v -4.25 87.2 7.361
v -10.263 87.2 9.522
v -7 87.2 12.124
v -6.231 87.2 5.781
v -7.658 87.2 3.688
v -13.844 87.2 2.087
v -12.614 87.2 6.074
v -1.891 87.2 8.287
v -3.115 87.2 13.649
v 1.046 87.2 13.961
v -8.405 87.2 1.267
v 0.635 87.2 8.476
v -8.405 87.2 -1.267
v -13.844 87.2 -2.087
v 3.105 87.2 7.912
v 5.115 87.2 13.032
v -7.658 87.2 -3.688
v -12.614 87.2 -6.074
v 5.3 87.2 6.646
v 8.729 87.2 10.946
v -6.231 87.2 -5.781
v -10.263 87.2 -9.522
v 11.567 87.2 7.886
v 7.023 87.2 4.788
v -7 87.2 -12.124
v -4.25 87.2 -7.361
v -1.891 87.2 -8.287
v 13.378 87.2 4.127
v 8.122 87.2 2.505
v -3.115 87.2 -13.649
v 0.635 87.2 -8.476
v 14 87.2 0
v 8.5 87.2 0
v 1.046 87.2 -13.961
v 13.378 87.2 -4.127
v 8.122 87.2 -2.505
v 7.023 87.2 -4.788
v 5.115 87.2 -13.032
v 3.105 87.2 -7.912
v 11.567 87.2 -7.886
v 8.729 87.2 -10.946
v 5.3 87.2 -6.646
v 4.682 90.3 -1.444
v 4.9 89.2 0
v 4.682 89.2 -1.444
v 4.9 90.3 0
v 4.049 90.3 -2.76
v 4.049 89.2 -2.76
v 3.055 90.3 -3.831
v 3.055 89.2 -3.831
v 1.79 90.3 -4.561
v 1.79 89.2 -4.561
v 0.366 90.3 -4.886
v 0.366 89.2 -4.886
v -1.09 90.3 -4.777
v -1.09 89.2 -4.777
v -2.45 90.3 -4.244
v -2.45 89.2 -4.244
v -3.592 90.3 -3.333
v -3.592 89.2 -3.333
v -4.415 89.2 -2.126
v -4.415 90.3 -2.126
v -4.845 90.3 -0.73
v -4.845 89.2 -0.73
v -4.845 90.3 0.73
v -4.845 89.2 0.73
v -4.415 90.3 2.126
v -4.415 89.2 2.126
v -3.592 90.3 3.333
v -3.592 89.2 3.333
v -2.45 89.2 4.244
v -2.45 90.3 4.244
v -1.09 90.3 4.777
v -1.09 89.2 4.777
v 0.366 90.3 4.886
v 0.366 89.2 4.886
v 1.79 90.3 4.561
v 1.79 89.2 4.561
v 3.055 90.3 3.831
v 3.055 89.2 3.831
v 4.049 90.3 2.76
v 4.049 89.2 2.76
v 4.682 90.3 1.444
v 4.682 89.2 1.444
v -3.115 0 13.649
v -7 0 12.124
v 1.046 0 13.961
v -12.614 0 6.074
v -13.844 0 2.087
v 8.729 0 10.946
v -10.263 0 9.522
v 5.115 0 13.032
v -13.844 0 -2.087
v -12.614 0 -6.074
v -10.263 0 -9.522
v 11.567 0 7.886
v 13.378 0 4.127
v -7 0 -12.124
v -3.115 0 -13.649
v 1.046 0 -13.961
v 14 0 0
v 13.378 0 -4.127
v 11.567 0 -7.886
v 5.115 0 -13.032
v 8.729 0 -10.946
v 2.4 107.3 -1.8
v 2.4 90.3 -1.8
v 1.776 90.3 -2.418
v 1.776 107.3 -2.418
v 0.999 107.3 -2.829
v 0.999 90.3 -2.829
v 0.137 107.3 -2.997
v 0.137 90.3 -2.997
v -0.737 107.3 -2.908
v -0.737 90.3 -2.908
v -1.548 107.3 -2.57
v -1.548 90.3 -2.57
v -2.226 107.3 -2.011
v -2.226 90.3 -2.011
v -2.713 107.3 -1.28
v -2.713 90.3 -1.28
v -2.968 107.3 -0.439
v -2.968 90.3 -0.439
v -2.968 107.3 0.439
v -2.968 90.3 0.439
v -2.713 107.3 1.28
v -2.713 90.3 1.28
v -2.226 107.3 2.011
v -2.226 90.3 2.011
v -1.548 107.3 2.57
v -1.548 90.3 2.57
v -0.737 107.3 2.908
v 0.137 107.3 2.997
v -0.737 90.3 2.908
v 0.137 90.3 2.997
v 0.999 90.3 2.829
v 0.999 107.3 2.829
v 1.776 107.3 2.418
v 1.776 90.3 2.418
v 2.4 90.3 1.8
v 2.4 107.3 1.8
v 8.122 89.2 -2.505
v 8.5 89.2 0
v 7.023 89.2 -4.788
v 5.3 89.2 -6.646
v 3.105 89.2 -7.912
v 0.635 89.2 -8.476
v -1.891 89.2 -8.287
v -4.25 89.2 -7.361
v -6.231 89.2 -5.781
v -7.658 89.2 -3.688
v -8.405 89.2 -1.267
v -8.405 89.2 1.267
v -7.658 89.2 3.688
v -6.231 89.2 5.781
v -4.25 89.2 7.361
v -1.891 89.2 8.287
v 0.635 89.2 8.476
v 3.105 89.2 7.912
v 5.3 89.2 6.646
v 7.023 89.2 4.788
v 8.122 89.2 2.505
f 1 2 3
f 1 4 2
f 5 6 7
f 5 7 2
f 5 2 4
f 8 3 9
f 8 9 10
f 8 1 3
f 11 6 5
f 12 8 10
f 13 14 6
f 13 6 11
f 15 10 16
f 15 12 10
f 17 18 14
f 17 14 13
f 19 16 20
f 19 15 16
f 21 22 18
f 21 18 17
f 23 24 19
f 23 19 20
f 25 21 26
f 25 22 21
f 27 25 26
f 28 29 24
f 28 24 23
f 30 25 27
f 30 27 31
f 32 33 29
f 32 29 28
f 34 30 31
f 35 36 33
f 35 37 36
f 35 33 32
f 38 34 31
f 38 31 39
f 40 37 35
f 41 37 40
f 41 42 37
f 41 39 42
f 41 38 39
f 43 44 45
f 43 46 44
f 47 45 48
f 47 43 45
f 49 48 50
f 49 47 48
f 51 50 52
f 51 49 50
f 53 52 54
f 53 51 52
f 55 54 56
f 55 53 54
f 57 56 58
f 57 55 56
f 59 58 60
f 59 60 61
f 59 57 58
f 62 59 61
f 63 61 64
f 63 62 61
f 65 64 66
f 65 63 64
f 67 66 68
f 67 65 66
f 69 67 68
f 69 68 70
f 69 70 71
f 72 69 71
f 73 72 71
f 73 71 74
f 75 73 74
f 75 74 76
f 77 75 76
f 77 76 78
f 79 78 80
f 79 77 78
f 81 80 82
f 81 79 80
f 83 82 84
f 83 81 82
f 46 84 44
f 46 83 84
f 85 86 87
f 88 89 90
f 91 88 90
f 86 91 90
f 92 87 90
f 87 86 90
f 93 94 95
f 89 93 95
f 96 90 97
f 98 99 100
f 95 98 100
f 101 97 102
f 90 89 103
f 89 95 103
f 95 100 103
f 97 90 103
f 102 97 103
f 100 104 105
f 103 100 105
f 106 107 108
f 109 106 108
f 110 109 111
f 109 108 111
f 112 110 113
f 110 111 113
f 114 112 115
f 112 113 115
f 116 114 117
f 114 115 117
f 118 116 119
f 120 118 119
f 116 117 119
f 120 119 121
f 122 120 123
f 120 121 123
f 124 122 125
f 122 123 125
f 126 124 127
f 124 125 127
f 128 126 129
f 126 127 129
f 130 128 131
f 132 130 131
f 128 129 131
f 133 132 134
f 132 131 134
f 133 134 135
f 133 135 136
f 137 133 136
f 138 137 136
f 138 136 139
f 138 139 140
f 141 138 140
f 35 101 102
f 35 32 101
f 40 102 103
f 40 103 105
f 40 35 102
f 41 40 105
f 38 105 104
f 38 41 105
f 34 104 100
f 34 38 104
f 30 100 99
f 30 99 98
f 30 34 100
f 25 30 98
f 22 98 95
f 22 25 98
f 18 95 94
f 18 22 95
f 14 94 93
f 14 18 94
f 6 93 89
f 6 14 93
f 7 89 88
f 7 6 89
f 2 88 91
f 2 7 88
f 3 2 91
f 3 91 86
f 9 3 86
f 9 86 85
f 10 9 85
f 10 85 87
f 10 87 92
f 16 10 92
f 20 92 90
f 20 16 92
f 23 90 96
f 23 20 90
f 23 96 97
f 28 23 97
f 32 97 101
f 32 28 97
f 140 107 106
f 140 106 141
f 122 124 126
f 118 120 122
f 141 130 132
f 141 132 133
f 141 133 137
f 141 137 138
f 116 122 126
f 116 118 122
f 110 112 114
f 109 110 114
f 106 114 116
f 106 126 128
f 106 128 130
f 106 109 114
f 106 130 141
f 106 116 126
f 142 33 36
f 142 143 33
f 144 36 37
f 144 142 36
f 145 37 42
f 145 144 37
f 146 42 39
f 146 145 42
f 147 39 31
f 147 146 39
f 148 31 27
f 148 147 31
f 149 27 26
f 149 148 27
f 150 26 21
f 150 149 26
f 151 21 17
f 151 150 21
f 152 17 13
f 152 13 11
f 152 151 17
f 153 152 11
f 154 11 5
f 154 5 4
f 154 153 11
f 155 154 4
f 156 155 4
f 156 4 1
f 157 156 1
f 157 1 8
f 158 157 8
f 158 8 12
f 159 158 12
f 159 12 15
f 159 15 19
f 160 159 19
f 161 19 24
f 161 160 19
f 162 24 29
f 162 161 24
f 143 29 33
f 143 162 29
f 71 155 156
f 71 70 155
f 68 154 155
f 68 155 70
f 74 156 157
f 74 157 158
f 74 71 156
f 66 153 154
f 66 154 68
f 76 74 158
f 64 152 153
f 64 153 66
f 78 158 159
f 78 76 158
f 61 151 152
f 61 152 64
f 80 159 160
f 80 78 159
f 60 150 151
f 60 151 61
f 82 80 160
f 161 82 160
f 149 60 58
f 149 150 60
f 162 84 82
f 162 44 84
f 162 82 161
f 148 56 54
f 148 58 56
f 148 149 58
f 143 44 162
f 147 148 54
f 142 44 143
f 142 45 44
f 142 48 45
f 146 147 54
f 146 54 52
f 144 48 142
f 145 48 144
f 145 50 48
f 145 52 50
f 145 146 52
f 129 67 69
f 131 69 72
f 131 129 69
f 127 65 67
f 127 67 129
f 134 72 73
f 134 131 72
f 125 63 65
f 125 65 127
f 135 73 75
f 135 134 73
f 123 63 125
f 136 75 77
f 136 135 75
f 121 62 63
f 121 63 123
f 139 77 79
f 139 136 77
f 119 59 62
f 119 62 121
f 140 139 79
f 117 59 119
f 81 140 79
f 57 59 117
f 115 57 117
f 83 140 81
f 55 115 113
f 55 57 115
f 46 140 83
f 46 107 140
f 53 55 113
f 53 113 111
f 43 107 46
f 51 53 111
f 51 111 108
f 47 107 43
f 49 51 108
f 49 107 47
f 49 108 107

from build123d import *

# Parameters (mm, degrees)
SKETCH_1_R          = 14
SKETCH_2_R          = 14
SKETCH_10_R         = 8.5
SKETCH_5_R          = 8.5
SKETCH_11_R         = 4.9
SKETCH_8_R          = 4.9
SKETCH_9_R          = 3
SKETCH_12_R         = 3
CUT_EXTRUDE_START   = -17
CUT_EXTRUDE_1_DEPTH = 17


with BuildPart() as part:
    # Эскиз1 → По сечениям2 section 0
    with BuildSketch(Plane(origin=(0, 0, 0), x_dir=(1, 0, 0), z_dir=(0, 1, 0))):
        Circle(SKETCH_1_R)
    # Эскиз2 → По сечениям2 section 1
    with BuildSketch(Plane(origin=(0, 87.2, 0), x_dir=(1, 0, 0), z_dir=(0, 1, 0))):
        Circle(SKETCH_2_R)
    loft()

    # Эскиз10 → По сечениям3 section 0
    with BuildSketch(Plane(origin=(0, 87.2, 0), x_dir=(1, 0, 0), z_dir=(0, 1, 0))):
        Circle(SKETCH_10_R)
    # Эскиз5 → По сечениям3 section 1
    with BuildSketch(Plane(origin=(0, 89.2, 0), x_dir=(1, 0, 0), z_dir=(0, 1, 0))):
        Circle(SKETCH_5_R)
    loft()

    # Эскиз11 → По сечениям4 section 0
    with BuildSketch(Plane(origin=(0, 89.2, 0), x_dir=(1, 0, 0), z_dir=(0, 1, 0))):
        Circle(SKETCH_11_R)
    # Эскиз8 → По сечениям4 section 1
    with BuildSketch(Plane(origin=(0, 90.3, 0), x_dir=(1, 0, 0), z_dir=(0, 1, 0))):
        Circle(SKETCH_8_R)
    loft()

    # Эскиз9 → По сечениям5 section 0
    with BuildSketch(Plane(origin=(0, 107.3, 0), x_dir=(1, 0, 0), z_dir=(0, 1, 0))):
        Circle(SKETCH_9_R)
    # Эскиз12 → По сечениям5 section 1
    with BuildSketch(Plane(origin=(0, 90.3, 0), x_dir=(1, 0, 0), z_dir=(0, 1, 0))):
        Circle(SKETCH_12_R)
    loft()

    # Эскиз13 → Вырез-Вытянуть1 (cut)
    with BuildSketch(Plane(origin=(0, 107.3, 0), x_dir=(1, 0, 0), z_dir=(0, 1, 0)).offset(CUT_EXTRUDE_START)):
        with BuildLine():
            Line((2.4, 1.8), (2.4, -1.8))
            ThreePointArc((2.4, -1.8), (2.846049894, -0.948683298), (3, 0))
            ThreePointArc((3, 0), (2.846049894, 0.948683298), (2.4, 1.8))
        make_face()
    extrude(amount=CUT_EXTRUDE_1_DEPTH, mode=Mode.SUBTRACT)


solid = part.part
